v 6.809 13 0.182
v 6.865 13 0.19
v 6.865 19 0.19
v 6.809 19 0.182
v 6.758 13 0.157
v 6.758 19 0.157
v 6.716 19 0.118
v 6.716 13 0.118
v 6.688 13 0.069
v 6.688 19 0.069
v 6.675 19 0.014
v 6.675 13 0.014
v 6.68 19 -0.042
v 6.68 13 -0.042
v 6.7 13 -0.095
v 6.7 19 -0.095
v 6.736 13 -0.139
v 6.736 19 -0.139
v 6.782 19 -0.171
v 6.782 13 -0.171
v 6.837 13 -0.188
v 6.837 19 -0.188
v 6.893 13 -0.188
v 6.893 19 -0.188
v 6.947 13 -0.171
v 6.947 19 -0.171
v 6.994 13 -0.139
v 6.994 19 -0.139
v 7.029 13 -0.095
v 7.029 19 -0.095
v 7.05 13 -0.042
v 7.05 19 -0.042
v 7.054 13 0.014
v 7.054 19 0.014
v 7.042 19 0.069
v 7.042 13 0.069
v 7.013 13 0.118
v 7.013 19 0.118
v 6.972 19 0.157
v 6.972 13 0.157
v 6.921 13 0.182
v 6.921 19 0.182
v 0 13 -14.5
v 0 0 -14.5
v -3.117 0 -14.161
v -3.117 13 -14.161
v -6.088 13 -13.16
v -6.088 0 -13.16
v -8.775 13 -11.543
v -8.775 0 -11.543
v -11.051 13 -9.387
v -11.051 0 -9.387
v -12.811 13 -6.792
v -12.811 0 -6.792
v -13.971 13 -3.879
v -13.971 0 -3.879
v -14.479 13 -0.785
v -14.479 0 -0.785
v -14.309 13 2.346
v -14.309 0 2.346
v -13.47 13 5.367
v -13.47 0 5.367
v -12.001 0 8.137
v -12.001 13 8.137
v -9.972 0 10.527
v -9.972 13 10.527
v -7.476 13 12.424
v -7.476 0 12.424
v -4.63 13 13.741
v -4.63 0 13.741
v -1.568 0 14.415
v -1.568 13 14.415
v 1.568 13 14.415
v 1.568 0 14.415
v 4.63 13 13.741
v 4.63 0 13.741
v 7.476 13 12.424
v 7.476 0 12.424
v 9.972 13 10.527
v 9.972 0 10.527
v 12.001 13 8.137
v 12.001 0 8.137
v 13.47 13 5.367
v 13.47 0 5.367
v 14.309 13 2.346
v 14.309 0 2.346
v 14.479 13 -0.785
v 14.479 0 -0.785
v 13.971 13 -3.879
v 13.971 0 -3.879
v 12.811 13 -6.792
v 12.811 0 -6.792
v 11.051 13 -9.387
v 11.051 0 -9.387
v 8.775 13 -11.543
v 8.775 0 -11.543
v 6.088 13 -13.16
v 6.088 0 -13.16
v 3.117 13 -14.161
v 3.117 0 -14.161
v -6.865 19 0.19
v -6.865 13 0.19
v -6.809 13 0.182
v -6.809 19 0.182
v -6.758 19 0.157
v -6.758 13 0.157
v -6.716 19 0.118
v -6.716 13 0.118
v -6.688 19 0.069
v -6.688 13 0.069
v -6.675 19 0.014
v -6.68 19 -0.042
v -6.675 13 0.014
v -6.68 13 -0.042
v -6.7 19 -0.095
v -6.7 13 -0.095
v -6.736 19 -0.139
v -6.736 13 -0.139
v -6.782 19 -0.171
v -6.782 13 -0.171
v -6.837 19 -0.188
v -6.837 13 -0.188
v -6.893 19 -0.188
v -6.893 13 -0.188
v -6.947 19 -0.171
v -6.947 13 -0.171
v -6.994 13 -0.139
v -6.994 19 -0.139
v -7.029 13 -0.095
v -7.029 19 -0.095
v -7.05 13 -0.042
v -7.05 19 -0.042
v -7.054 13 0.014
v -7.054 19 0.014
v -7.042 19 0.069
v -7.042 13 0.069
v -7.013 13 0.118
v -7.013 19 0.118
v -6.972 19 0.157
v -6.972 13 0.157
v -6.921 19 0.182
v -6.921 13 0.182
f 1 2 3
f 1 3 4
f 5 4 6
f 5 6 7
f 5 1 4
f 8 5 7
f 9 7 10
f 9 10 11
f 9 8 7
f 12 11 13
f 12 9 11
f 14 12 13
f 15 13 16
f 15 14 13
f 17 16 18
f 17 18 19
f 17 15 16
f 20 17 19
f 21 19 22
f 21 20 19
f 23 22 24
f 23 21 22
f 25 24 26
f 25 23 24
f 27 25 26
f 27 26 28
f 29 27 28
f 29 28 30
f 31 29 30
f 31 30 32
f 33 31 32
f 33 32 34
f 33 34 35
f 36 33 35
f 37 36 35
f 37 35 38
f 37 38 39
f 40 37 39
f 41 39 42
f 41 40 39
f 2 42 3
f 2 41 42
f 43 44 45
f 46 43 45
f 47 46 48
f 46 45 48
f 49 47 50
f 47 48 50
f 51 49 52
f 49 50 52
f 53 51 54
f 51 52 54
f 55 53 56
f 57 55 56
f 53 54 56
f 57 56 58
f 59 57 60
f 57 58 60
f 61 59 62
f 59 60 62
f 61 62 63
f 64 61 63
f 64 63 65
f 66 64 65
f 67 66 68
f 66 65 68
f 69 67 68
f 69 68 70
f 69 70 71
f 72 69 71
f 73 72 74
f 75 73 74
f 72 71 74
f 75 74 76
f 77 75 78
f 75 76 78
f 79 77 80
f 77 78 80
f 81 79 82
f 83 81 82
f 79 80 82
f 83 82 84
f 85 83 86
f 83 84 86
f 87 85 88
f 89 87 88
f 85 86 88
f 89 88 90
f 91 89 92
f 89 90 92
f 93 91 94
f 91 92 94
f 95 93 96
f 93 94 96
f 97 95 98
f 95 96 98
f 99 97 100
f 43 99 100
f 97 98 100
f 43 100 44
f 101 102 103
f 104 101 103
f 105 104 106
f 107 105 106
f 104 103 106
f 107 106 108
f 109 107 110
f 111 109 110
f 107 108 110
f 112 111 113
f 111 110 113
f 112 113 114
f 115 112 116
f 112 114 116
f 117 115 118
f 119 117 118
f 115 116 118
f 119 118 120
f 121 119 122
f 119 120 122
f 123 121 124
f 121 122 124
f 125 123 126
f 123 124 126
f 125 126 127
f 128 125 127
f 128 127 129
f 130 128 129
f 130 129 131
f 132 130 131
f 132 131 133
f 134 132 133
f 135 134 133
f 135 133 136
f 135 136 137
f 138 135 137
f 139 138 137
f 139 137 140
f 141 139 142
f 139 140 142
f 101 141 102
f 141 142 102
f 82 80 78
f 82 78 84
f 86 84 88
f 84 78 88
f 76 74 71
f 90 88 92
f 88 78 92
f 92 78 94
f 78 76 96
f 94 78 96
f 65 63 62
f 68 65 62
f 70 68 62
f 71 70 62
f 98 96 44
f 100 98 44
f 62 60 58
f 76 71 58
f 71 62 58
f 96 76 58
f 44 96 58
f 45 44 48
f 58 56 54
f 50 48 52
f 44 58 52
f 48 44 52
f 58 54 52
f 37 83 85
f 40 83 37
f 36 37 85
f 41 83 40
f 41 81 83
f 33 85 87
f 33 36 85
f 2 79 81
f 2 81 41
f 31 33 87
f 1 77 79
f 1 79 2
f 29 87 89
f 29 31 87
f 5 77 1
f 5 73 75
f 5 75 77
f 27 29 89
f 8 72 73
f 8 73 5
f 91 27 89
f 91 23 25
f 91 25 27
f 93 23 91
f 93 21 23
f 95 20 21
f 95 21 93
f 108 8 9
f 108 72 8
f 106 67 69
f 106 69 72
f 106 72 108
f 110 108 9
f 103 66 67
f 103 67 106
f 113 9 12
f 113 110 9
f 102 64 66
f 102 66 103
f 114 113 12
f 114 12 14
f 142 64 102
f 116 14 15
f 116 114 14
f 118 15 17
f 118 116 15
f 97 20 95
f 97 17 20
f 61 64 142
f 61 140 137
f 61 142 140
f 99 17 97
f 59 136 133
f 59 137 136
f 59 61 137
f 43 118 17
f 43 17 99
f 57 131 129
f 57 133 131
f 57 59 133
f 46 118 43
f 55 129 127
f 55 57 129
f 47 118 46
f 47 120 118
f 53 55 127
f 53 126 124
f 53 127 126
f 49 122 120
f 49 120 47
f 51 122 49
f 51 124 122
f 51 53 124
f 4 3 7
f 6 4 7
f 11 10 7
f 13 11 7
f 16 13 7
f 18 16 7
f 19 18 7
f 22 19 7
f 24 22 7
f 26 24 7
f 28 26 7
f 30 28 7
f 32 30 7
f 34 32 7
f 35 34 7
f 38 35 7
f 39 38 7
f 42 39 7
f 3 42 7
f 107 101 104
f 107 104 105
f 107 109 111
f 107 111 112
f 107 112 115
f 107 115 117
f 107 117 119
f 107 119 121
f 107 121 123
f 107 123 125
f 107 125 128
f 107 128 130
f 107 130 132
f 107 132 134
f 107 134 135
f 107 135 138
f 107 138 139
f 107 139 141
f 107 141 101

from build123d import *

# Parameters (mm, degrees)
ESQUISSE1_R        = 14.5
BOSS_EXTRU_1_DEPTH = 13
ESQUISSE2_R        = 0.190045057
BOSS_EXTRU_2_DEPTH = 6


with BuildPart() as part:
    # Esquisse1 → Boss.-Extru.1 (new body)
    with BuildSketch(Plane(origin=(0, 0, 0), x_dir=(1, 0, 0), z_dir=(0, 1, 0))):
        with Locations(Location((0, 0, 0), (0, 0, 90))):
            Circle(ESQUISSE1_R)
    extrude(amount=BOSS_EXTRU_1_DEPTH)

    # Esquisse2 → Boss.-Extru.2 (add)
    with BuildSketch(Plane(origin=(0, 13, 0), x_dir=(1, 0, 0), z_dir=(0, 1, 0))):
        with Locations(Location((-6.864876716, 0, 0), (0, 0, 270))):
            Circle(ESQUISSE2_R)
    boss_extru_2 = extrude(amount=BOSS_EXTRU_2_DEPTH)

    # Symétrie1: Boss.-Extru.2 across plane
    add(boss_extru_2.mirror(Plane(origin=(0, 0, 0), x_dir=(0, 0, 1), z_dir=(1, 0, 0))))


solid = part.part
